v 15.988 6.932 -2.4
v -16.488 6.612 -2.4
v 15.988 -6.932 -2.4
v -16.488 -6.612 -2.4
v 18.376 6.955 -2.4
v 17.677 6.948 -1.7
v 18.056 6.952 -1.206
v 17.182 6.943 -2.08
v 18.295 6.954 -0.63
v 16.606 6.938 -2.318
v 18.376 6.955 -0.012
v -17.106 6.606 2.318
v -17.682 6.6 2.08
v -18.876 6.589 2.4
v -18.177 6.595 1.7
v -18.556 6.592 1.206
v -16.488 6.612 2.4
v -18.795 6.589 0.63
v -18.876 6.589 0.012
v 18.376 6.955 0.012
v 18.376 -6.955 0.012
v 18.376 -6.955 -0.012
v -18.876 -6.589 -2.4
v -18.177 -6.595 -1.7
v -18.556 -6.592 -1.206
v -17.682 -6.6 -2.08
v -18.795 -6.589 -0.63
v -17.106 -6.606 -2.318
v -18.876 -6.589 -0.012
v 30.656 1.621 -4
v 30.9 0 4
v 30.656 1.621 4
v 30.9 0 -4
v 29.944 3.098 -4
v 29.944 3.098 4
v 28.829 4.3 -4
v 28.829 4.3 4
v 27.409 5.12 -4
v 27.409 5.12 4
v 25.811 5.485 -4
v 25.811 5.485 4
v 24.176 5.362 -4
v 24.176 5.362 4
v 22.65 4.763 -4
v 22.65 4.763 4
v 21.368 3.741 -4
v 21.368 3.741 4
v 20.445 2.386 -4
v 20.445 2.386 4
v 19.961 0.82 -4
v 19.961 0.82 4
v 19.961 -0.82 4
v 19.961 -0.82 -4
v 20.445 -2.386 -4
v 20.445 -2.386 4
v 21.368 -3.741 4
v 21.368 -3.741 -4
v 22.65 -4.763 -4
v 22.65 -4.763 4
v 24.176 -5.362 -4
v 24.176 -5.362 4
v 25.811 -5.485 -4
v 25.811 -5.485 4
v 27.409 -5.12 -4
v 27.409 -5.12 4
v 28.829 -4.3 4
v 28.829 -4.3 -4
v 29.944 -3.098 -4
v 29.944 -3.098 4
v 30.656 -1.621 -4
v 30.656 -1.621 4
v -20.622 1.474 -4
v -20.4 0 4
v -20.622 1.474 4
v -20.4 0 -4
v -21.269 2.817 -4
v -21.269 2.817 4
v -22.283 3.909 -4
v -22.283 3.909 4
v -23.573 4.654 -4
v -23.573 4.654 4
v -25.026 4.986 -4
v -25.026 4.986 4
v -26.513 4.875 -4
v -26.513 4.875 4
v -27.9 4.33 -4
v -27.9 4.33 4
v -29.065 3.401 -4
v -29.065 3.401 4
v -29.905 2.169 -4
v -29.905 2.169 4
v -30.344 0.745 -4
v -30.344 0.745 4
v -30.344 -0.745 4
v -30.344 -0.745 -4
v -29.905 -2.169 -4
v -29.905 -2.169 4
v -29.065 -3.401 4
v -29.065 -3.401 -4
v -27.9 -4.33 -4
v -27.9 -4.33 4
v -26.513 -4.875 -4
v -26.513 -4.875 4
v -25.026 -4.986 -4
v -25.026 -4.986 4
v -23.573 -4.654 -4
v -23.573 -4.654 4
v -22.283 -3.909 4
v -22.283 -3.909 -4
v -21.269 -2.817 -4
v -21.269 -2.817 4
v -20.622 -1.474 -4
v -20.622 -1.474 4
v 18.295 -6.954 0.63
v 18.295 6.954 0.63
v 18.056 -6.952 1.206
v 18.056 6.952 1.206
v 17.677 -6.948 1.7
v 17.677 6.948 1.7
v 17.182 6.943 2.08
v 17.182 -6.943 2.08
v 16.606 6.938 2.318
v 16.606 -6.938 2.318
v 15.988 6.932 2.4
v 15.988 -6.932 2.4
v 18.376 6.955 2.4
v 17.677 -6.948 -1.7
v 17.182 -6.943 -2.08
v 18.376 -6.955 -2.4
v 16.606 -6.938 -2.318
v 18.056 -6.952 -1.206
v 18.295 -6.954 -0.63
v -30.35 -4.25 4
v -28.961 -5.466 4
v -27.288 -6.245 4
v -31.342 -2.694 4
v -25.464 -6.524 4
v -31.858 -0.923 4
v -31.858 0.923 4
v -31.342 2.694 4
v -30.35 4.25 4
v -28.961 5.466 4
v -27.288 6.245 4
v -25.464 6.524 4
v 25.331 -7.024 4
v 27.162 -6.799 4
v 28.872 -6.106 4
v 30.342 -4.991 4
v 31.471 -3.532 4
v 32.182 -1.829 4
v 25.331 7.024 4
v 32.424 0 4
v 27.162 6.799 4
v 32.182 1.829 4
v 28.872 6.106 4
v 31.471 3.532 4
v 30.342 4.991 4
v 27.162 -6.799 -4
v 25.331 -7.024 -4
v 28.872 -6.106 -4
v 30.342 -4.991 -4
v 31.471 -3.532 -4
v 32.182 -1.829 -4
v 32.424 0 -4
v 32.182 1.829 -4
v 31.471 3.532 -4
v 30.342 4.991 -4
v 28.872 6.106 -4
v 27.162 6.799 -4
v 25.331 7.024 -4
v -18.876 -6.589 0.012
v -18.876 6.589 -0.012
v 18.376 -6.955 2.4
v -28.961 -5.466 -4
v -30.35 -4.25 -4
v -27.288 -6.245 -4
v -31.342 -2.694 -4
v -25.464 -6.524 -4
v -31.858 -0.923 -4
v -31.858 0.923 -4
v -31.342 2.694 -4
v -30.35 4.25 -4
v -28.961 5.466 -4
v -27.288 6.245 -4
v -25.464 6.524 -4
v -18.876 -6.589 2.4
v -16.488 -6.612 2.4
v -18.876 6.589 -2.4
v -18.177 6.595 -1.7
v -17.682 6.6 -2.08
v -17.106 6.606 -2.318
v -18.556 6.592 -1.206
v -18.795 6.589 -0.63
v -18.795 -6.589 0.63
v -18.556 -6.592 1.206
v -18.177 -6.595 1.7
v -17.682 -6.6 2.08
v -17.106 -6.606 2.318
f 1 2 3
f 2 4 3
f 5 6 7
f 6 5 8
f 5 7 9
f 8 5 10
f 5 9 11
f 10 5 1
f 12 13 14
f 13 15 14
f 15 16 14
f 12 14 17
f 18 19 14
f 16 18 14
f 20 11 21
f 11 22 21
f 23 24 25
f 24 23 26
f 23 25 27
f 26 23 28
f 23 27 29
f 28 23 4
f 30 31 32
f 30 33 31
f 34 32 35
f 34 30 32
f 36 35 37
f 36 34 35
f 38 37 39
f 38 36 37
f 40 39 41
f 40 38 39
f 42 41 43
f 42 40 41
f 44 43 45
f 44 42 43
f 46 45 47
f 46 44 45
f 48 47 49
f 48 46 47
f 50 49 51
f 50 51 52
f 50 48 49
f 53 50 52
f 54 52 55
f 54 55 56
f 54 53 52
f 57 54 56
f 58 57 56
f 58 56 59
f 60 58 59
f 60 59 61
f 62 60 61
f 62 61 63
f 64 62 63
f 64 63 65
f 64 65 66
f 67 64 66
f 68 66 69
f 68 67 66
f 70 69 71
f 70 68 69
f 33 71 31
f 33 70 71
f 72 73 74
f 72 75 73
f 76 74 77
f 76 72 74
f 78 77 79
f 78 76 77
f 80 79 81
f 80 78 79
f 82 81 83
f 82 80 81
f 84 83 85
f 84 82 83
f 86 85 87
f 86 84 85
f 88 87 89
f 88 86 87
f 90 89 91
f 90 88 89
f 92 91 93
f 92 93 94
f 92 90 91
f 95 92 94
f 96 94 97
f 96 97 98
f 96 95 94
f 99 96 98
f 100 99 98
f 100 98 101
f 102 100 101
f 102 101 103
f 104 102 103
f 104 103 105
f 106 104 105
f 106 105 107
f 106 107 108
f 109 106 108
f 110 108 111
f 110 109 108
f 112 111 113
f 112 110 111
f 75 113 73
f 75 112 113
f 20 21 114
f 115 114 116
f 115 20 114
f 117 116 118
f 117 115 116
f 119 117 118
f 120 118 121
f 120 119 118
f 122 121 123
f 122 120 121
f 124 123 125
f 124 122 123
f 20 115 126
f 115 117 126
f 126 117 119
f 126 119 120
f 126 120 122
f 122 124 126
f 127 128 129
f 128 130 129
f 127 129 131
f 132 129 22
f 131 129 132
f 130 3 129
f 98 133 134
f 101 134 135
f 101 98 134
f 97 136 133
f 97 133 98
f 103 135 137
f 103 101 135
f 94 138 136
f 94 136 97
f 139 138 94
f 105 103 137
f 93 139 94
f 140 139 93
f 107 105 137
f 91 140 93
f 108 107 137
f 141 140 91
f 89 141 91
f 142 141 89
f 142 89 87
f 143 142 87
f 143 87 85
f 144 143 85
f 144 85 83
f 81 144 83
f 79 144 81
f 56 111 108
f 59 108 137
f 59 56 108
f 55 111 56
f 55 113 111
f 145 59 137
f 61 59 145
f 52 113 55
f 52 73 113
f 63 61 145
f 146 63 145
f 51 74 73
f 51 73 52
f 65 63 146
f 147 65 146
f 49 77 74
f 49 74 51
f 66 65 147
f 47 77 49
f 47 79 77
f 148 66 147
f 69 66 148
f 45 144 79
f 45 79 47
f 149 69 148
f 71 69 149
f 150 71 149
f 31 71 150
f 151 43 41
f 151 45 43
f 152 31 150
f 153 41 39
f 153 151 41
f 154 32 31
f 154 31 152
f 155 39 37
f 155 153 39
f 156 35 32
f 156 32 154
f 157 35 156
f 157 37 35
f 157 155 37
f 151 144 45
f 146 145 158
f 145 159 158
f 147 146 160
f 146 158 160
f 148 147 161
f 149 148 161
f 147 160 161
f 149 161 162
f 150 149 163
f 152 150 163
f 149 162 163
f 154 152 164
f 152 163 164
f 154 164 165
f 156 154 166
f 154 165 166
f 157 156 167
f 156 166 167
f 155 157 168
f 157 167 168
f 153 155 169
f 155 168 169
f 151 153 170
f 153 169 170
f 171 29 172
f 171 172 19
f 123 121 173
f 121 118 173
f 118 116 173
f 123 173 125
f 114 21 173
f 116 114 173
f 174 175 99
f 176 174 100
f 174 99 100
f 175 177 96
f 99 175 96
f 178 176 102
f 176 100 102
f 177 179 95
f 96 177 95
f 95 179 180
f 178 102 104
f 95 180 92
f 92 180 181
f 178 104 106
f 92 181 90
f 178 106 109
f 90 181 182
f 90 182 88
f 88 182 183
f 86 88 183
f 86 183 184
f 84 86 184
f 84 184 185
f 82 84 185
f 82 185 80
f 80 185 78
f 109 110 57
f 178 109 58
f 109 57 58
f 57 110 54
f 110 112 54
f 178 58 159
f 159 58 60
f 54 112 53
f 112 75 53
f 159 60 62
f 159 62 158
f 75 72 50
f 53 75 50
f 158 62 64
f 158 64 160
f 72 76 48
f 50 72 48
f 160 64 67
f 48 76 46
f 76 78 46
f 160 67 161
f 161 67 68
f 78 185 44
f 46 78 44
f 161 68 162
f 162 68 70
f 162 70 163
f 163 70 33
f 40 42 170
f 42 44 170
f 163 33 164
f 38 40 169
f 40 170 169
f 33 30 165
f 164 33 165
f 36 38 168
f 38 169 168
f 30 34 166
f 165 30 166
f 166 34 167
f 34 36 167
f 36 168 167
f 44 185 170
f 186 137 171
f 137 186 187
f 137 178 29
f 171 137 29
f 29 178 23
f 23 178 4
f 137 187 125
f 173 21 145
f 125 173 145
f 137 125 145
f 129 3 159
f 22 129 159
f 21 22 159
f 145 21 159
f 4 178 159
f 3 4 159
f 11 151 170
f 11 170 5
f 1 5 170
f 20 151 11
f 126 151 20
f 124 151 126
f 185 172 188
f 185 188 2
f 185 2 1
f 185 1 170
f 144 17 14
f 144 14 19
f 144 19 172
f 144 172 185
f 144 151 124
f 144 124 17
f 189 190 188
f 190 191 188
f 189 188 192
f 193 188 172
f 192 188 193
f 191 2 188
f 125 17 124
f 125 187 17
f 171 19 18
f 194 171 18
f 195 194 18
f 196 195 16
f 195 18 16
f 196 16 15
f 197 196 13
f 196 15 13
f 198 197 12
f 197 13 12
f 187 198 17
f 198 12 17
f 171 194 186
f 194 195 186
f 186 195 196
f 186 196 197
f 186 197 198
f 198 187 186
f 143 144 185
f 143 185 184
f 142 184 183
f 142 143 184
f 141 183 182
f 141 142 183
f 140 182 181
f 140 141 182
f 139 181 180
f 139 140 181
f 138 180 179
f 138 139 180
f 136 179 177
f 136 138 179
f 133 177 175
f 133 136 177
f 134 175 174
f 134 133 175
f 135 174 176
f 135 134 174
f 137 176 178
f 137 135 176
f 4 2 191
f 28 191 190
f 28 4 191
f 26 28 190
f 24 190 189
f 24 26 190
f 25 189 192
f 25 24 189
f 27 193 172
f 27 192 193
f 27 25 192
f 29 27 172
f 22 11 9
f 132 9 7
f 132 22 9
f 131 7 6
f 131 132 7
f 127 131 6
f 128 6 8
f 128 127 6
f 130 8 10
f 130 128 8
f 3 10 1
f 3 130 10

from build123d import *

# Parameters (mm, degrees)
F0_R          = 5.5
F0_R_2        = 5
F2_DEPTH      = 4
F3_W          = 37.252
F3_H          = 4.7996
F4_DEPTH      = 7.025
F4_DEPTH_BACK = 7.025
F5_T4_DEPTH   = 25.1150634776
F5_T10_DEPTH  = 25.1150634776
F5_T16_DEPTH  = 25.8484060864
F5_T22_DEPTH  = 25.8484060864


# Not quite as in the source:
# - a fillet or chamfer that OpenCascade refuses, or shapes differently, is made with other operations: its cross-section is extruded or revolved along the edge and cut away or added


with BuildPart() as f2:
    # F0 (on Top) → F2 (new body, symmetric)
    with BuildSketch(Plane.XY):
        with BuildLine():
            ThreePointArc((-25.4642125984, 6.5236839855), (-20.8095940807, 4.6358116329), (-18.876, 0))
            ThreePointArc((-18.876, 0), (-20.8095940807, -4.6358116329), (-25.4642125984, -6.5236839855))
            Line((-25.4642125984, -6.5236839855), (25.3308661417, -7.0236597661))
            ThreePointArc((25.3308661417, -7.0236597661), (18.376, 0), (25.3308661417, 7.0236597661))
            Line((25.3308661417, 7.0236597661), (-25.4642125984, 6.5236839855))
        make_face()
        with BuildLine():
            ThreePointArc((32.424, 0), (30.3422150793, 4.9911006913), (25.3308661417, 7.0236597661))
            ThreePointArc((25.3308661417, 7.0236597661), (18.376, 0), (25.3308661417, -7.0236597661))
            ThreePointArc((25.3308661417, -7.0236597661), (30.3422150793, -4.9911006913), (32.424, 0))
        make_face()
        with Locations((25.4, 0)):
            Circle(F0_R, mode=Mode.SUBTRACT)
        with BuildLine():
            ThreePointArc((-25.4642125984, -6.5236839855), (-20.8095940807, -4.6358116329), (-18.876, 0))
            ThreePointArc((-18.876, 0), (-20.8095940807, 4.6358116329), (-25.4642125984, 6.5236839855))
            ThreePointArc((-25.4642125984, 6.5236839855), (-31.924, 0), (-25.4642125984, -6.5236839855))
        make_face()
        with Locations((-25.4, 0)):
            Circle(F0_R_2, mode=Mode.SUBTRACT)
    extrude(amount=F2_DEPTH, both=True)

    # F3 (on Front) → F4 (cut, two sides)
    with BuildSketch(Plane.XZ) as f4_sk:
        with Locations((-0.25, 0)):
            Rectangle(F3_W, F3_H)
    extrude(amount=-F4_DEPTH, mode=Mode.SUBTRACT)
    extrude(f4_sk.sketch, amount=F4_DEPTH_BACK, mode=Mode.SUBTRACT)

    # F5: fillet of radius 2.3876 on 4 edges, made by hand


with BuildPart() as f5_tool2:
    # F5_s3 → F5_t4 (new body)
    with BuildSketch(Plane.XZ.offset(-12.5575317388)):
        with BuildLine():
            ThreePointArc((-18.876, 0.0122), (-18.1766881508, 1.7004881508), (-16.4884, 2.3998))
            Line((-16.4884, 2.3998), (-18.876, 2.3998))
            Line((-18.876, 2.3998), (-18.876, 0.0122))
        make_face()
    extrude(amount=F5_T4_DEPTH)

    split(bisect_by=Plane(origin=(-0.0666732283, 6.7736718758, 0), x_dir=(0, 0, 1), z_dir=(0.0098425197, -0.9999515612, 0)), keep=Keep.TOP)

    split(bisect_by=Plane(origin=(-0.0666732283, -6.7736718758, 0), x_dir=(0, 0, 1), z_dir=(0.0098425197, 0.9999515612, 0)), keep=Keep.TOP)


with BuildPart() as f2_1:
    add(f2.part)

    # F5_t1: union F5_tool2
    add(f5_tool2.part)


with BuildPart() as f5_tool8:
    # F5_s9 → F5_t10 (new body)
    with BuildSketch(Plane.XZ.offset(12.5575317388)):
        with BuildLine():
            ThreePointArc((-16.4884, -2.3998), (-18.1766881508, -1.7004881508), (-18.876, -0.0122))
            Line((-18.876, -0.0122), (-18.876, -2.3998))
            Line((-18.876, -2.3998), (-16.4884, -2.3998))
        make_face()
    extrude(amount=-F5_T10_DEPTH)

    split(bisect_by=Plane(origin=(-0.0666732283, 6.7736718758, 0), x_dir=(0, 0, 1), z_dir=(0.0098425197, -0.9999515612, 0)), keep=Keep.TOP)

    split(bisect_by=Plane(origin=(-0.0666732283, -6.7736718758, 0), x_dir=(0, 0, 1), z_dir=(0.0098425197, 0.9999515612, 0)), keep=Keep.TOP)


with BuildPart() as f2_2:
    add(f2_1.part)

    # F5_t7: union F5_tool8
    add(f5_tool8.part)


with BuildPart() as f5_tool14:
    # F5_s15 → F5_t16 (new body)
    with BuildSketch(Plane.XZ.offset(12.9242030432)):
        with BuildLine():
            ThreePointArc((18.376, -0.0122), (17.6766881508, -1.7004881508), (15.9884, -2.3998))
            Line((15.9884, -2.3998), (18.376, -2.3998))
            Line((18.376, -2.3998), (18.376, -0.0122))
        make_face()
    extrude(amount=-F5_T16_DEPTH)

    split(bisect_by=Plane(origin=(-0.0666732283, 6.7736718758, 0), x_dir=(0, 0, 1), z_dir=(0.0098425197, -0.9999515612, 0)), keep=Keep.TOP)

    split(bisect_by=Plane(origin=(-0.0666732283, -6.7736718758, 0), x_dir=(0, 0, 1), z_dir=(0.0098425197, 0.9999515612, 0)), keep=Keep.TOP)


with BuildPart() as f2_3:
    add(f2_2.part)

    # F5_t13: union F5_tool14
    add(f5_tool14.part)


with BuildPart() as f5_tool20:
    # F5_s21 → F5_t22 (new body)
    with BuildSketch(Plane.XZ.offset(-12.9242030432)):
        with BuildLine():
            ThreePointArc((18.376, 0.0122), (17.6766881508, 1.7004881508), (15.9884, 2.3998))
            Line((15.9884, 2.3998), (18.376, 2.3998))
            Line((18.376, 2.3998), (18.376, 0.0122))
        make_face()
    extrude(amount=F5_T22_DEPTH)

    split(bisect_by=Plane(origin=(-0.0666732283, 6.7736718758, 0), x_dir=(0, 0, 1), z_dir=(0.0098425197, -0.9999515612, 0)), keep=Keep.TOP)

    split(bisect_by=Plane(origin=(-0.0666732283, -6.7736718758, 0), x_dir=(0, 0, 1), z_dir=(0.0098425197, 0.9999515612, 0)), keep=Keep.TOP)


with BuildPart() as f2_4:
    add(f2_3.part)

    # F5_t19: union F5_tool20
    add(f5_tool20.part)


solid = f2_4.part
